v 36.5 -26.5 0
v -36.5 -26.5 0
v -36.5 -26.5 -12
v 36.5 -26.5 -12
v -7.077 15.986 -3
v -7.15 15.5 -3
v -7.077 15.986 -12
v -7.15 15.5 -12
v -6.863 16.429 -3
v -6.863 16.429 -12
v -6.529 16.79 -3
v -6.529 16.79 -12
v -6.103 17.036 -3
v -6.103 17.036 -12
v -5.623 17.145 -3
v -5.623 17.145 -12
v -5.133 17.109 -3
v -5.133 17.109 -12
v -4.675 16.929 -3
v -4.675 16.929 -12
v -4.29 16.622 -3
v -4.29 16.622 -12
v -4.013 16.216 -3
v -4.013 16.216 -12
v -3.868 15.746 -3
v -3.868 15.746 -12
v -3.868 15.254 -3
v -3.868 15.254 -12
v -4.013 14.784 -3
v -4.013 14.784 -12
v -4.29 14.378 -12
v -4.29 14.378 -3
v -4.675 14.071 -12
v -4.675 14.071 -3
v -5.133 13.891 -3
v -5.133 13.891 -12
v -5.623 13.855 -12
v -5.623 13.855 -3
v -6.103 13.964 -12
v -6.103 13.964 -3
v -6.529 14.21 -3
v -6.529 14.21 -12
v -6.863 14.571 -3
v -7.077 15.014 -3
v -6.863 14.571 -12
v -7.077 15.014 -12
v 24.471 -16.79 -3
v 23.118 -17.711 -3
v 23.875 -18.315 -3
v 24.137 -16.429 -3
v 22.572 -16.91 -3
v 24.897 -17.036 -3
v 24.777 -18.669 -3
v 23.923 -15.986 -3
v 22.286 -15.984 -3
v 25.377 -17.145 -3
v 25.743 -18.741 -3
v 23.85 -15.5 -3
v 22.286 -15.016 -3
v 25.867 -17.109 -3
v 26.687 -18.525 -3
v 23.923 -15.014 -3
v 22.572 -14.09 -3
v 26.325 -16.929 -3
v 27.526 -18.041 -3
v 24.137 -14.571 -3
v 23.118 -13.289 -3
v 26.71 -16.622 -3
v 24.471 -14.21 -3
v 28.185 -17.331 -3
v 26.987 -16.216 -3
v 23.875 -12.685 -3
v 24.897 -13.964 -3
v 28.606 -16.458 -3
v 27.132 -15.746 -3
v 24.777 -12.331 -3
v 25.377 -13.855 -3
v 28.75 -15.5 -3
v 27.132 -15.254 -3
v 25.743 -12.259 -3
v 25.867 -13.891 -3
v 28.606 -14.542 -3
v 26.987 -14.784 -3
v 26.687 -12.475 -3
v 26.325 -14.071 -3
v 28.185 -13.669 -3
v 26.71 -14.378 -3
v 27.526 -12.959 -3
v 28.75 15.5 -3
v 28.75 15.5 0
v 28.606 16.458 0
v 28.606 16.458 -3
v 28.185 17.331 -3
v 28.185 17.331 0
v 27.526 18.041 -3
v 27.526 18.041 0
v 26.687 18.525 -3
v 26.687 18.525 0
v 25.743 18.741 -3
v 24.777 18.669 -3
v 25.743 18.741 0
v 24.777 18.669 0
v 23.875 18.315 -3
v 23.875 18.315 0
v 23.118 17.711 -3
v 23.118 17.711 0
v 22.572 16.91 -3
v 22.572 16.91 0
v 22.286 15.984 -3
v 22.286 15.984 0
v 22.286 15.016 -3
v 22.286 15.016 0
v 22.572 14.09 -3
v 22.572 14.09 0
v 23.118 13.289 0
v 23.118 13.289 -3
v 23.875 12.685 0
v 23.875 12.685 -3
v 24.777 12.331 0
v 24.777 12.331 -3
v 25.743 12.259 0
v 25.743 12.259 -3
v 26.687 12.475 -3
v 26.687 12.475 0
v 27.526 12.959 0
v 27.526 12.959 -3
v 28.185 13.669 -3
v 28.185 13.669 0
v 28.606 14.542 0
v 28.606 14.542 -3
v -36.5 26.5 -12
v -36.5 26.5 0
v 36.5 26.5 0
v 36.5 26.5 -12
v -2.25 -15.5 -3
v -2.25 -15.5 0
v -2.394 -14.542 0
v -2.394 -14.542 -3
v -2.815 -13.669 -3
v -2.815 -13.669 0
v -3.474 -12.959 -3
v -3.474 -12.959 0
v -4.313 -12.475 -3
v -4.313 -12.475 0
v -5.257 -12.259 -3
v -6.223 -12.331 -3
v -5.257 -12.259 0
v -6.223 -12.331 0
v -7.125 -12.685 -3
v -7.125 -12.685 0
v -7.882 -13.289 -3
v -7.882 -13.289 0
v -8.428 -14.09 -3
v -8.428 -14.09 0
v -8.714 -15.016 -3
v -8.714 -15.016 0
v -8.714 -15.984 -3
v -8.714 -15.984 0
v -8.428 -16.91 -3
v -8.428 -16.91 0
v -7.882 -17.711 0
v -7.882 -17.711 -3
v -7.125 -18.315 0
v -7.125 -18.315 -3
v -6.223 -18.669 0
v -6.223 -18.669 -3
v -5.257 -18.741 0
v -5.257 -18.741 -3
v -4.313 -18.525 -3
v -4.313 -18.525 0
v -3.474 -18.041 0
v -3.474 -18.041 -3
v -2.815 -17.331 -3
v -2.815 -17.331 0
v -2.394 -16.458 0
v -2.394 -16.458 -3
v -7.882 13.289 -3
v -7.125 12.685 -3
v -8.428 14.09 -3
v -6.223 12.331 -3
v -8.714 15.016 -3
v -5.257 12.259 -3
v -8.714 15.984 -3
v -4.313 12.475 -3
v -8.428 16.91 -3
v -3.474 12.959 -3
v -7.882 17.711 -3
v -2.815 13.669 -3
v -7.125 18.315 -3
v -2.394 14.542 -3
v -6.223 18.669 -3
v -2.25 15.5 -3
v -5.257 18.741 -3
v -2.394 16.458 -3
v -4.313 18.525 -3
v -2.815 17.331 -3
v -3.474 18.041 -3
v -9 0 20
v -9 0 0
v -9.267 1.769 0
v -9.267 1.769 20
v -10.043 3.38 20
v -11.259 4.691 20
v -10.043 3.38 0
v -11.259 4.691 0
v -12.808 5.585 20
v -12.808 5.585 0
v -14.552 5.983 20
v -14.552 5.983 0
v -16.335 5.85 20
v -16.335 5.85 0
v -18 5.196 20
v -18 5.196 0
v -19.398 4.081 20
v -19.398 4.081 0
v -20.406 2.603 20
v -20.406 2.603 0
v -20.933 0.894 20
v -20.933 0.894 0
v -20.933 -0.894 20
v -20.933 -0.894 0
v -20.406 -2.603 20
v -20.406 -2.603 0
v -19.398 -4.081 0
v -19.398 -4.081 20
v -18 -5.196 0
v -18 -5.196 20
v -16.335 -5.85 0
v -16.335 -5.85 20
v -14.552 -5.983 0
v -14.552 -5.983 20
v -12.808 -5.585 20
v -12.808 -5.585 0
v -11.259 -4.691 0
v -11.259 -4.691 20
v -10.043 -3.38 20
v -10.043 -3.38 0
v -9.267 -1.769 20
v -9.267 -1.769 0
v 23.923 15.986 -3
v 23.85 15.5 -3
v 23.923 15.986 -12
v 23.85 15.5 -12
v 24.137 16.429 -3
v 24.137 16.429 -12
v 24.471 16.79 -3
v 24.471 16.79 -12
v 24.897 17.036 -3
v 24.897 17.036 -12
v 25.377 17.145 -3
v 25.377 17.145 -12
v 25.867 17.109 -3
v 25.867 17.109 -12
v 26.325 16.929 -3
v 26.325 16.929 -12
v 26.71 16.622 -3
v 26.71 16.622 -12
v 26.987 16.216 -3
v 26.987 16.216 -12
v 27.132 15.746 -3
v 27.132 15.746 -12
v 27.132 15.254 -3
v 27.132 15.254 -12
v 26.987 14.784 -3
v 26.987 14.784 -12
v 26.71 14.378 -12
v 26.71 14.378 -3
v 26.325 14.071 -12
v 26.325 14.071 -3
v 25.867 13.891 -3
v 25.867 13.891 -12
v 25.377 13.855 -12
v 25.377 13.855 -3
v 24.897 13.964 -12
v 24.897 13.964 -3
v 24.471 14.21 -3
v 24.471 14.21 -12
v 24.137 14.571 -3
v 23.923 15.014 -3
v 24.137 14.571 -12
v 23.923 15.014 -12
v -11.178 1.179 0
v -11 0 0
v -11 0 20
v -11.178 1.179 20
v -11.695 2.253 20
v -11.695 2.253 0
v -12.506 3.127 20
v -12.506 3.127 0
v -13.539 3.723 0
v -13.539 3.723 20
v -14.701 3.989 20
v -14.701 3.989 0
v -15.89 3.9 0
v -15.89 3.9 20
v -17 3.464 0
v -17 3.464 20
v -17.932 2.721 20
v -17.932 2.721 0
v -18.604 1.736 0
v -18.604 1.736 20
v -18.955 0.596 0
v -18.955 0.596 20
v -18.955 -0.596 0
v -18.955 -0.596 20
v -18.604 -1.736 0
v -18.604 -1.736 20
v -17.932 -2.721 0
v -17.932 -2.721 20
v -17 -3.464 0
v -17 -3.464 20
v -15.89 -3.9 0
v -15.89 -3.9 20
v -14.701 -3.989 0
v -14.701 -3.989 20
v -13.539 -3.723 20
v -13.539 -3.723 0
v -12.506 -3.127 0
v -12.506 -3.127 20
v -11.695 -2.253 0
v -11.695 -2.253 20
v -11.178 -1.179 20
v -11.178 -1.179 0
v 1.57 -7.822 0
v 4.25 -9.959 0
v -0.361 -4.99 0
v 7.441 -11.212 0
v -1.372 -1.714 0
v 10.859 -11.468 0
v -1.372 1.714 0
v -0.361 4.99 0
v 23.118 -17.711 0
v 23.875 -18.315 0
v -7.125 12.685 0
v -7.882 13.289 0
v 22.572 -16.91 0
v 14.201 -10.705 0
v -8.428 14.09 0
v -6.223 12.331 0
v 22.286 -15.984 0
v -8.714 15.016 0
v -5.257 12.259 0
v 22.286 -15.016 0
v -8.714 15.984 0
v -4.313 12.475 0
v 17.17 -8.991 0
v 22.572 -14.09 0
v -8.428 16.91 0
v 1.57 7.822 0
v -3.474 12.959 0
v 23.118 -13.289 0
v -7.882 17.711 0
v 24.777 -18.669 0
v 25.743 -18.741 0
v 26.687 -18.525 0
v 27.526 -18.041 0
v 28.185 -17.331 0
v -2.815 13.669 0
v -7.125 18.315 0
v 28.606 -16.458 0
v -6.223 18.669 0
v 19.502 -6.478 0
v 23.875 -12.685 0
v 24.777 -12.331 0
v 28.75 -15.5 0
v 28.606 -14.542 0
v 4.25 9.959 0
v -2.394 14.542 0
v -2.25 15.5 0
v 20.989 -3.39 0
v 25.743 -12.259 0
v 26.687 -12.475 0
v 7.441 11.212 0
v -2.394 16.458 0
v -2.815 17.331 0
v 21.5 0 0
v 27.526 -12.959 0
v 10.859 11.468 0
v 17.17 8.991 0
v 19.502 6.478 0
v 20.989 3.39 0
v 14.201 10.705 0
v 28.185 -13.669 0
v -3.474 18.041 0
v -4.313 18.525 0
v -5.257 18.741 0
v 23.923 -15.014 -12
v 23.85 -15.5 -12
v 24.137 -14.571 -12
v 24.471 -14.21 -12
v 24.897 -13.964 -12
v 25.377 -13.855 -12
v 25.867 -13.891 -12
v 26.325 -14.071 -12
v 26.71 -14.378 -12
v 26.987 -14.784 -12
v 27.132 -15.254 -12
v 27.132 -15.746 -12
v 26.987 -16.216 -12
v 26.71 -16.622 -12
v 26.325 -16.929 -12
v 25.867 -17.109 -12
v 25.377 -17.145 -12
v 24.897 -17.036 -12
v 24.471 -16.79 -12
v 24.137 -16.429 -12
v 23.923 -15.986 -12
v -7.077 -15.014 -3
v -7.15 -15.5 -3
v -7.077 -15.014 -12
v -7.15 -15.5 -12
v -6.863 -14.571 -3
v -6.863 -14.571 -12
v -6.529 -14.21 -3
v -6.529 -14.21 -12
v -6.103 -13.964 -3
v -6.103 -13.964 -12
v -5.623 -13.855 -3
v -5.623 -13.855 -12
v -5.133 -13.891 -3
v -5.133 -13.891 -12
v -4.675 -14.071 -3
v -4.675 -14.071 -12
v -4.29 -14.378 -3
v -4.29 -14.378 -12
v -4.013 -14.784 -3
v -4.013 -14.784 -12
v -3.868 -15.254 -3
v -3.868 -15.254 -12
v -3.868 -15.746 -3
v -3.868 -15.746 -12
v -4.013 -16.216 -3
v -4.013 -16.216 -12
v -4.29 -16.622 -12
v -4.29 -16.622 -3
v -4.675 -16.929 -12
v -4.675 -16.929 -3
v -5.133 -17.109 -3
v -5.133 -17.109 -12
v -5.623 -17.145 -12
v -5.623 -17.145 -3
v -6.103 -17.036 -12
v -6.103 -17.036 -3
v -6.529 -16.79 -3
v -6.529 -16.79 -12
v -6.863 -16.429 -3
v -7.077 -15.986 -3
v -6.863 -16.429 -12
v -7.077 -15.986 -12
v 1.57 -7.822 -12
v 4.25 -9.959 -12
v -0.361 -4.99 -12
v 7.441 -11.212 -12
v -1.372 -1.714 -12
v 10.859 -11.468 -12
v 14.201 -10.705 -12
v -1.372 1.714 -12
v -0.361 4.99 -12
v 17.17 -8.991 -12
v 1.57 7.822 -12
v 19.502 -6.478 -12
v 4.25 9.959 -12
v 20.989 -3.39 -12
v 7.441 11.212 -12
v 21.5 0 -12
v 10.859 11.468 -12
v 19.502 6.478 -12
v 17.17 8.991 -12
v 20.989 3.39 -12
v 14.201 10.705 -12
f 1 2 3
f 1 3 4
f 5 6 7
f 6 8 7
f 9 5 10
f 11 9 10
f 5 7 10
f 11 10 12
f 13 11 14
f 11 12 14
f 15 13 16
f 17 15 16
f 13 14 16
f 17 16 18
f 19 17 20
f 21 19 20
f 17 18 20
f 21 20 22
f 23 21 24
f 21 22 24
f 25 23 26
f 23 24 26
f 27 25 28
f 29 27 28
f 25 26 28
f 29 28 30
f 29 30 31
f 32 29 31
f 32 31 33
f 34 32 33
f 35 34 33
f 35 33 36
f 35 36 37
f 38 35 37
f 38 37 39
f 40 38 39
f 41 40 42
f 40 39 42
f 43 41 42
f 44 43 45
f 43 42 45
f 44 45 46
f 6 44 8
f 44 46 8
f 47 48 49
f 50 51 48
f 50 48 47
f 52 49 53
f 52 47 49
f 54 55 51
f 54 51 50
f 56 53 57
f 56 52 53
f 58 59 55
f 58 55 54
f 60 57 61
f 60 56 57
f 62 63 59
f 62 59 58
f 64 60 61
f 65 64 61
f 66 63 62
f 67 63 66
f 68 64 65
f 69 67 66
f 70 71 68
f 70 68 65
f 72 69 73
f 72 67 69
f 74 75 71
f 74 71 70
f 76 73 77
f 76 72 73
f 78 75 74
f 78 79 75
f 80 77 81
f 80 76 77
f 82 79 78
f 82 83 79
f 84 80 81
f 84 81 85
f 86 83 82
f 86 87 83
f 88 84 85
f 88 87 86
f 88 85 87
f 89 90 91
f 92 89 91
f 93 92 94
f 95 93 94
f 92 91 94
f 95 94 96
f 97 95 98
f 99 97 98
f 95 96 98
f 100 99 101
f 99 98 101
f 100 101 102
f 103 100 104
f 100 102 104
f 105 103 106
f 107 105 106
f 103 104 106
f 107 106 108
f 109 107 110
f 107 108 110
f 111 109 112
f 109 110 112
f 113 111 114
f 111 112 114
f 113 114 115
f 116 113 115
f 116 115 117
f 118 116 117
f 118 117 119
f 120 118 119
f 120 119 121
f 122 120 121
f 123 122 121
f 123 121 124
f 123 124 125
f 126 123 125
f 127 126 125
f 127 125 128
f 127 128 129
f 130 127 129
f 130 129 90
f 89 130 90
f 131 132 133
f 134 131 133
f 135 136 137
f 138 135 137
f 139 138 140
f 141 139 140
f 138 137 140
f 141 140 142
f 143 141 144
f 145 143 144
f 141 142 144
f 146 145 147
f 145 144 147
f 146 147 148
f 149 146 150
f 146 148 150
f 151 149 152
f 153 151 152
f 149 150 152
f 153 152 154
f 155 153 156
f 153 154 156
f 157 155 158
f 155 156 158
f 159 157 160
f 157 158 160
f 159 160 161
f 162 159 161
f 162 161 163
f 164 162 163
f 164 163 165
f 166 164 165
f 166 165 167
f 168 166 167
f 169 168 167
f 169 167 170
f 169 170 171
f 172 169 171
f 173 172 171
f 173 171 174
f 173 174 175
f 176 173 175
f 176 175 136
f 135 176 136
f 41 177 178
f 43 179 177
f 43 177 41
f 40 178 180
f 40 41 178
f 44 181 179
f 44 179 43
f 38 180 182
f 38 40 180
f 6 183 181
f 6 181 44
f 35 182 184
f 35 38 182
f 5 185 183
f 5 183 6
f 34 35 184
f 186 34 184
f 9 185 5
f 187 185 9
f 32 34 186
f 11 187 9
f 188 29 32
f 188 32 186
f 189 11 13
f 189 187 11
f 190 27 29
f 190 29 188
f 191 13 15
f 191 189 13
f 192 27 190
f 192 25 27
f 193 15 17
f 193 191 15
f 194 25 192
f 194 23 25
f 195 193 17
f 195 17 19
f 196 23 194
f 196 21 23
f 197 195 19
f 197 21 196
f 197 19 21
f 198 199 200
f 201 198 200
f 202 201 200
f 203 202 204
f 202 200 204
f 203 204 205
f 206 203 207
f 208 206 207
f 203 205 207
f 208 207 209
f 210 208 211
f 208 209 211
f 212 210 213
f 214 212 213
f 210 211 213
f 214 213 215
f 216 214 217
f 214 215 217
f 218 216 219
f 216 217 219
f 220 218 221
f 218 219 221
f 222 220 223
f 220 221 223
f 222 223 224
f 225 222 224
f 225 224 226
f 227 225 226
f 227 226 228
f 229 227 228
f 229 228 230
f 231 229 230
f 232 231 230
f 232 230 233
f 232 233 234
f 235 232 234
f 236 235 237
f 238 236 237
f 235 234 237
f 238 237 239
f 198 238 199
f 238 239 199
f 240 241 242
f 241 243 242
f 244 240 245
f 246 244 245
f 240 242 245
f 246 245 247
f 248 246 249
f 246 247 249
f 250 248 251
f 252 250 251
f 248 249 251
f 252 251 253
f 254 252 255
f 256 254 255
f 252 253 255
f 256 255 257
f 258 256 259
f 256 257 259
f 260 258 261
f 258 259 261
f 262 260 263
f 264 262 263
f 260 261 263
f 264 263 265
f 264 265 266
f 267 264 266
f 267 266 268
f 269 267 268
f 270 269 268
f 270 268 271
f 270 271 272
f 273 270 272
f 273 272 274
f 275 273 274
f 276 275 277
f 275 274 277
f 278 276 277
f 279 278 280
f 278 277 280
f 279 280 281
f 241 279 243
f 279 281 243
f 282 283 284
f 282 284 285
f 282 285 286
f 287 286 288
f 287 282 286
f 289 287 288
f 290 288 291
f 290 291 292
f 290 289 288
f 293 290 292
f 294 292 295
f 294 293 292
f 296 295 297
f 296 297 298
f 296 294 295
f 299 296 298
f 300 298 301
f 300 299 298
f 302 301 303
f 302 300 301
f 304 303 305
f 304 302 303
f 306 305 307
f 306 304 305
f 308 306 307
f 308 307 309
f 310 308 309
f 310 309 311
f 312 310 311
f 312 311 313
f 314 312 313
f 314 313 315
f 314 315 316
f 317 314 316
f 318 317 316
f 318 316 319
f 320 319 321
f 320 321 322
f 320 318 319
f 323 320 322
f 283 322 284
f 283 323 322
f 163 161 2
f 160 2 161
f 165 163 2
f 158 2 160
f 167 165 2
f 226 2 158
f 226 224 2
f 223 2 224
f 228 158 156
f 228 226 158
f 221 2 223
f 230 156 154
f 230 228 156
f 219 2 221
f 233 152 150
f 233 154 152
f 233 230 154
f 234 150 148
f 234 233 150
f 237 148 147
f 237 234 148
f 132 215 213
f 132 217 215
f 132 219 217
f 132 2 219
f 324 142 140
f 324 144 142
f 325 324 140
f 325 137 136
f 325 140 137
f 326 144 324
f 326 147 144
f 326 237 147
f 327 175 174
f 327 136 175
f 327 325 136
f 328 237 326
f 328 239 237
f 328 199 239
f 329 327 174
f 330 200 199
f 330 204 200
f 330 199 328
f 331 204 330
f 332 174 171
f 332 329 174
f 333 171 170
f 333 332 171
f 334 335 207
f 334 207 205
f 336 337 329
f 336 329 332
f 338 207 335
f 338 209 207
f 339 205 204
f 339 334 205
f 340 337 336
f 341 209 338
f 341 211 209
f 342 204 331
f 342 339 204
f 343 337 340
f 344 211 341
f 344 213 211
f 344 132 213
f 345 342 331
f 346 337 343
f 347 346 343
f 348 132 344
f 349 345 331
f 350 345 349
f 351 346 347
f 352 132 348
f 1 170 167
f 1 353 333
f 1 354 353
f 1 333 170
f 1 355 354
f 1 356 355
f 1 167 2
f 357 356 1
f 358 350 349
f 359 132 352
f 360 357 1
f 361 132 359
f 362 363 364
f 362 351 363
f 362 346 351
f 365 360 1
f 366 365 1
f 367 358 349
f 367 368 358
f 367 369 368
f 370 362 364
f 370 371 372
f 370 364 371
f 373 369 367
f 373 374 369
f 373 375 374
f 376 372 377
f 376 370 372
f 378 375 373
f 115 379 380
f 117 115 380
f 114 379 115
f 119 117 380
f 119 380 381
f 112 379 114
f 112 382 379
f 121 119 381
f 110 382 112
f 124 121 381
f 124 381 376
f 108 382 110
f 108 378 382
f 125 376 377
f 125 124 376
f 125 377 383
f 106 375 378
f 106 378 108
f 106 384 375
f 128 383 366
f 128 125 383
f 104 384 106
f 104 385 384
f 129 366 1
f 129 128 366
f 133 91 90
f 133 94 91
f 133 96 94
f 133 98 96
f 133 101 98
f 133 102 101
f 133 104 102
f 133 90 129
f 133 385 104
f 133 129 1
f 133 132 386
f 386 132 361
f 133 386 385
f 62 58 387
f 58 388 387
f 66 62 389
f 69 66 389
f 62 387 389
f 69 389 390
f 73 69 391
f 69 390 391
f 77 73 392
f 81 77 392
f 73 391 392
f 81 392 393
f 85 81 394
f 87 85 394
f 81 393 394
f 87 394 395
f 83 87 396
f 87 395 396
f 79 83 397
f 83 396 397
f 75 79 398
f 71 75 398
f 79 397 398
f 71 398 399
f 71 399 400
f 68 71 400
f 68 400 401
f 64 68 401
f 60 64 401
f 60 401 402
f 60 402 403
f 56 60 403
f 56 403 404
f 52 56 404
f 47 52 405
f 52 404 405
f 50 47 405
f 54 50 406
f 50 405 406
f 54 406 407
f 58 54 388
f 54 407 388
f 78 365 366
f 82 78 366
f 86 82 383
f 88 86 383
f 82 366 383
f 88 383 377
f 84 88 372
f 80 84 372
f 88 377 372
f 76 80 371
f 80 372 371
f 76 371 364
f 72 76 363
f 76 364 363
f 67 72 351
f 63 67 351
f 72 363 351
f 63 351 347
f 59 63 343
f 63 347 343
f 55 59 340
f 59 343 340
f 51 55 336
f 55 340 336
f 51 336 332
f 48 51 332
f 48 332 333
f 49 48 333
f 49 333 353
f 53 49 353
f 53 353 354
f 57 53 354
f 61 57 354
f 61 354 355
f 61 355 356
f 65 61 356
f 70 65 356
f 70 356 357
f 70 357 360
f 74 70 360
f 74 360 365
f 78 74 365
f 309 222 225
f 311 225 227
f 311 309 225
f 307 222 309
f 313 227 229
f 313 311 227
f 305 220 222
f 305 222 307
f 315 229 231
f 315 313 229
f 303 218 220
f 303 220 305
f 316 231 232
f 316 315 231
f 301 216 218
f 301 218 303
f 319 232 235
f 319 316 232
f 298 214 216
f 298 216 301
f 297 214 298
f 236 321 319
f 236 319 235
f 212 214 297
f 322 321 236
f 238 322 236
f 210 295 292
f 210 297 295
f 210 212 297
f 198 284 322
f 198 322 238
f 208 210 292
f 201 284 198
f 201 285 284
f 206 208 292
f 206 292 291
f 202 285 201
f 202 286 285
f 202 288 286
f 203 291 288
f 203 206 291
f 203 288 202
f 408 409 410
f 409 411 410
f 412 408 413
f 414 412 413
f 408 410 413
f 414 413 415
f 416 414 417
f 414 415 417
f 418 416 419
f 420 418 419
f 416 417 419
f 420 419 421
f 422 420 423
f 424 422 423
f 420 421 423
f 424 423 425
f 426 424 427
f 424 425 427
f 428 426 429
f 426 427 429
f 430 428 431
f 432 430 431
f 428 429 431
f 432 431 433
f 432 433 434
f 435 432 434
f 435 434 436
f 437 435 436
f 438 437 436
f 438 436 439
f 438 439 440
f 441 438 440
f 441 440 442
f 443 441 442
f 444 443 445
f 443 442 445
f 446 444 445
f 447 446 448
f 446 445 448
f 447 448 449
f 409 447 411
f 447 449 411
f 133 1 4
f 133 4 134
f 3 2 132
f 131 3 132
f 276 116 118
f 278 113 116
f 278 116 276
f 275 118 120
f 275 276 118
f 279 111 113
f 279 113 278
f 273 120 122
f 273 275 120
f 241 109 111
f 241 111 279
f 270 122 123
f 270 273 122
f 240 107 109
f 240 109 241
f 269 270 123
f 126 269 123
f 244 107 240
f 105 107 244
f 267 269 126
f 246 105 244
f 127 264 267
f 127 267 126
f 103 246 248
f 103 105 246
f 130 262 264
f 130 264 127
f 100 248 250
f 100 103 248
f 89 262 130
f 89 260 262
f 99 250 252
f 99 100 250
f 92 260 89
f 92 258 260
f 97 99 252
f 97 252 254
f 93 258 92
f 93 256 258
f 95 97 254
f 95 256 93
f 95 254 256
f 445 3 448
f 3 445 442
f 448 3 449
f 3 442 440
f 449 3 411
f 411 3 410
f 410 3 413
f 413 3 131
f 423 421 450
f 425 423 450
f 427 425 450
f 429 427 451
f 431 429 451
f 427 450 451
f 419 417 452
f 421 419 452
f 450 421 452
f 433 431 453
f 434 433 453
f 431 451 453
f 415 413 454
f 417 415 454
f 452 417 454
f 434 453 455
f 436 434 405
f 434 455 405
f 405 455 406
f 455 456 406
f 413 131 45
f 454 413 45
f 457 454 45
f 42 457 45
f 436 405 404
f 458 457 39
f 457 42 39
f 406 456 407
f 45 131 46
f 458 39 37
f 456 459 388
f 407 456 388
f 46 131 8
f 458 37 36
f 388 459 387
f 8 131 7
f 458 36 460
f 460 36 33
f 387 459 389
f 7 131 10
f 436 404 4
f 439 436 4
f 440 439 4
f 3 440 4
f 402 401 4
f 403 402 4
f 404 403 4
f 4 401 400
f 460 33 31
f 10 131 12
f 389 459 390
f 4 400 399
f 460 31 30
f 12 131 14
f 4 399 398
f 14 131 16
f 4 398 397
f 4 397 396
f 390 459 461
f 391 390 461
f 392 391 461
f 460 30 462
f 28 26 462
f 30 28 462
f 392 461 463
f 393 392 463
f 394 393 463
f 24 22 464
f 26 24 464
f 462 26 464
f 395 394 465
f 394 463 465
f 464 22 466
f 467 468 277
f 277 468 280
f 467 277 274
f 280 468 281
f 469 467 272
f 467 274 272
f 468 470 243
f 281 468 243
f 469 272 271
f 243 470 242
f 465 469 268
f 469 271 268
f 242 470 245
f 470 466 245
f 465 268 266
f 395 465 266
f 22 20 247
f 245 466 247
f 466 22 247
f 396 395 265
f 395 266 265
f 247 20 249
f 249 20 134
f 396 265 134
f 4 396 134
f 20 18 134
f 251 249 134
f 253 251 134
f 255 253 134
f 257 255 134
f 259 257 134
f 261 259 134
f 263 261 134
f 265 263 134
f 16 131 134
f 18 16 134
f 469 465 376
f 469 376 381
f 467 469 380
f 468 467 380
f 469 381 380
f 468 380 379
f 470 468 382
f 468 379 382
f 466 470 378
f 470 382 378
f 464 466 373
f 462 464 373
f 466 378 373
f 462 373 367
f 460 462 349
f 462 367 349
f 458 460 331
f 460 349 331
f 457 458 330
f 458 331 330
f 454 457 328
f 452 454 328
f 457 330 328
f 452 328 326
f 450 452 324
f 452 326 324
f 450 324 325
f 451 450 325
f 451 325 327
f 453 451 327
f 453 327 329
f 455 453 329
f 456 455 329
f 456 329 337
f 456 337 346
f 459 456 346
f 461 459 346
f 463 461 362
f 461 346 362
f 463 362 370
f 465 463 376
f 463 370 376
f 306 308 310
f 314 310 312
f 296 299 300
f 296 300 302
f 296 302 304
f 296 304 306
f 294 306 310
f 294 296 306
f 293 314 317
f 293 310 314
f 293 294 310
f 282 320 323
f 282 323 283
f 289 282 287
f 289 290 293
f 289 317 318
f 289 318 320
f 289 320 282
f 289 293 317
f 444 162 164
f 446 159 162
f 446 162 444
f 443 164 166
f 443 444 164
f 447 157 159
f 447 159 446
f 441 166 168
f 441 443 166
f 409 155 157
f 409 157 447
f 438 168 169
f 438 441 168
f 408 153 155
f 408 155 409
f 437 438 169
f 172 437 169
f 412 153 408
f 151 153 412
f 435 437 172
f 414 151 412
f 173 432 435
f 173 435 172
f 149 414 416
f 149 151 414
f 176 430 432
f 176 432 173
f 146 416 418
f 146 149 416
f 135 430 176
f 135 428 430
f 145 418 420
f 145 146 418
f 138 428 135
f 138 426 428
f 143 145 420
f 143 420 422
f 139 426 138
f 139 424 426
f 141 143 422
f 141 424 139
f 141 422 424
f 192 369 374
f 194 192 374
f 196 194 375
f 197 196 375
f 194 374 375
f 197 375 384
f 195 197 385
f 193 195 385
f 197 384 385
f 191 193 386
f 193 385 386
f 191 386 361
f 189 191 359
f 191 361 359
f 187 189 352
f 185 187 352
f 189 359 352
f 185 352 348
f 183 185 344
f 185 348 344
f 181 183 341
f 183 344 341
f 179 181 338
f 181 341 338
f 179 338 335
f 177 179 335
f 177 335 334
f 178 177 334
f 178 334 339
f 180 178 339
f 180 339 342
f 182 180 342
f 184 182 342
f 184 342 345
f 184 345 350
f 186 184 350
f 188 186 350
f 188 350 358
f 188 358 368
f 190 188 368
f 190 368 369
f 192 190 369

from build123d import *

# Parameters (mm, degrees)
F0_W           = 73
F0_H           = 53
F0_R           = 6
F0_R_2         = 11.5
F0_R_3         = 4
F1_DEPTH       = 12
F2_DEPTH       = 20
F3_D           = 3.3
F3_CBORE_D     = 6.5
F3_CBORE_DEPTH = 3


with BuildPart() as f1:
    # F0 (on Top) → F1 (new body)
    with BuildSketch(Plane.XY):
        Rectangle(F0_W, F0_H)
        with Locations((-15, 0)):
            Circle(F0_R, mode=Mode.SUBTRACT)
        with Locations((10, 0)):
            Circle(F0_R_2, mode=Mode.SUBTRACT)
        with Locations((-15, 0)):
            Circle(F0_R)
        with Locations((-15, 0)):
            Circle(F0_R_3, mode=Mode.SUBTRACT)
        with Locations((-15, 0)):
            Circle(F0_R_3)
    extrude(amount=-F1_DEPTH)

    # F0 (on Top) → F2 (join)
    with BuildSketch(Plane.XY):
        with Locations((-15, 0)):
            Circle(F0_R)
        with Locations((-15, 0)):
            Circle(F0_R_3, mode=Mode.SUBTRACT)
    extrude(amount=F2_DEPTH)

    # F3 (through all)
    with Locations(Plane.XY):
        with Locations((-5.5, 15.5), (25.5, 15.5), (25.5, -15.5), (-5.5, -15.5)):
            CounterBoreHole(F3_D / 2, F3_CBORE_D / 2, F3_CBORE_DEPTH)


solid = f1.part
